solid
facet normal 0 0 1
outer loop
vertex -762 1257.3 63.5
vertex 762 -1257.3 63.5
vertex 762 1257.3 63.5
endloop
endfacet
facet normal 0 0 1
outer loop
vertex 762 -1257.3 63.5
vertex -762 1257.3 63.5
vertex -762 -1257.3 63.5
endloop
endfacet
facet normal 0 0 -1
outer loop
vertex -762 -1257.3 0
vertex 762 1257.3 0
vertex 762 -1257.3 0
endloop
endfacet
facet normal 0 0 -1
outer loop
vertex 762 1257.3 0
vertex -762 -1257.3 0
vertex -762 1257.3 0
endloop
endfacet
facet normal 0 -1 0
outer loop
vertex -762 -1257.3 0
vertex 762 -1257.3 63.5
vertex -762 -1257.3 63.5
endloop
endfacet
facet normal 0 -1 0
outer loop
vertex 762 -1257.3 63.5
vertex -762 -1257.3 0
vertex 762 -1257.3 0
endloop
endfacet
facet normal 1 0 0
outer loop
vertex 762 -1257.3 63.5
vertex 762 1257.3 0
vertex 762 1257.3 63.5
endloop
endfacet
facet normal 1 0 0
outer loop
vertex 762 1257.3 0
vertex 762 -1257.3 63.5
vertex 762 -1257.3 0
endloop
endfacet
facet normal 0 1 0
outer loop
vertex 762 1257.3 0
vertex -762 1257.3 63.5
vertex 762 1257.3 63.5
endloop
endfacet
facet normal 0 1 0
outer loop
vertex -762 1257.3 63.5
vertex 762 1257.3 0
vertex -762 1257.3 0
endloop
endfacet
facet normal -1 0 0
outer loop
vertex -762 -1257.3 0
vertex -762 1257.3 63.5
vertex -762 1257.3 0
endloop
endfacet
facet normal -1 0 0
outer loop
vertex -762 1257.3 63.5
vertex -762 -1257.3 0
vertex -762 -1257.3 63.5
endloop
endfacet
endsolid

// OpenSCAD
// file: ../lib/colors.scad
module color_wood() {
  color("#f2ba52")
    children();
}

module color_hdpe() {
  color("#ccd")
    children();
}

module color_steel() {
  color("#888")
    children();
}
// file: ../lib/convert.scad
function inches(in) = in * 25.4;
function feet(ft) = inches(ft * 12);
// main file
use <../lib/convert.scad>
use <../lib/colors.scad>

floor_thickness = inches(2.5);
floor_width = feet(5);
floor_length = feet(8) + inches(3);

module teardrop_floor() {
  translate([0, 0, floor_thickness / 2])
    color_wood()
      cube([floor_width, floor_length, floor_thickness], center = true);
}

teardrop_floor();
